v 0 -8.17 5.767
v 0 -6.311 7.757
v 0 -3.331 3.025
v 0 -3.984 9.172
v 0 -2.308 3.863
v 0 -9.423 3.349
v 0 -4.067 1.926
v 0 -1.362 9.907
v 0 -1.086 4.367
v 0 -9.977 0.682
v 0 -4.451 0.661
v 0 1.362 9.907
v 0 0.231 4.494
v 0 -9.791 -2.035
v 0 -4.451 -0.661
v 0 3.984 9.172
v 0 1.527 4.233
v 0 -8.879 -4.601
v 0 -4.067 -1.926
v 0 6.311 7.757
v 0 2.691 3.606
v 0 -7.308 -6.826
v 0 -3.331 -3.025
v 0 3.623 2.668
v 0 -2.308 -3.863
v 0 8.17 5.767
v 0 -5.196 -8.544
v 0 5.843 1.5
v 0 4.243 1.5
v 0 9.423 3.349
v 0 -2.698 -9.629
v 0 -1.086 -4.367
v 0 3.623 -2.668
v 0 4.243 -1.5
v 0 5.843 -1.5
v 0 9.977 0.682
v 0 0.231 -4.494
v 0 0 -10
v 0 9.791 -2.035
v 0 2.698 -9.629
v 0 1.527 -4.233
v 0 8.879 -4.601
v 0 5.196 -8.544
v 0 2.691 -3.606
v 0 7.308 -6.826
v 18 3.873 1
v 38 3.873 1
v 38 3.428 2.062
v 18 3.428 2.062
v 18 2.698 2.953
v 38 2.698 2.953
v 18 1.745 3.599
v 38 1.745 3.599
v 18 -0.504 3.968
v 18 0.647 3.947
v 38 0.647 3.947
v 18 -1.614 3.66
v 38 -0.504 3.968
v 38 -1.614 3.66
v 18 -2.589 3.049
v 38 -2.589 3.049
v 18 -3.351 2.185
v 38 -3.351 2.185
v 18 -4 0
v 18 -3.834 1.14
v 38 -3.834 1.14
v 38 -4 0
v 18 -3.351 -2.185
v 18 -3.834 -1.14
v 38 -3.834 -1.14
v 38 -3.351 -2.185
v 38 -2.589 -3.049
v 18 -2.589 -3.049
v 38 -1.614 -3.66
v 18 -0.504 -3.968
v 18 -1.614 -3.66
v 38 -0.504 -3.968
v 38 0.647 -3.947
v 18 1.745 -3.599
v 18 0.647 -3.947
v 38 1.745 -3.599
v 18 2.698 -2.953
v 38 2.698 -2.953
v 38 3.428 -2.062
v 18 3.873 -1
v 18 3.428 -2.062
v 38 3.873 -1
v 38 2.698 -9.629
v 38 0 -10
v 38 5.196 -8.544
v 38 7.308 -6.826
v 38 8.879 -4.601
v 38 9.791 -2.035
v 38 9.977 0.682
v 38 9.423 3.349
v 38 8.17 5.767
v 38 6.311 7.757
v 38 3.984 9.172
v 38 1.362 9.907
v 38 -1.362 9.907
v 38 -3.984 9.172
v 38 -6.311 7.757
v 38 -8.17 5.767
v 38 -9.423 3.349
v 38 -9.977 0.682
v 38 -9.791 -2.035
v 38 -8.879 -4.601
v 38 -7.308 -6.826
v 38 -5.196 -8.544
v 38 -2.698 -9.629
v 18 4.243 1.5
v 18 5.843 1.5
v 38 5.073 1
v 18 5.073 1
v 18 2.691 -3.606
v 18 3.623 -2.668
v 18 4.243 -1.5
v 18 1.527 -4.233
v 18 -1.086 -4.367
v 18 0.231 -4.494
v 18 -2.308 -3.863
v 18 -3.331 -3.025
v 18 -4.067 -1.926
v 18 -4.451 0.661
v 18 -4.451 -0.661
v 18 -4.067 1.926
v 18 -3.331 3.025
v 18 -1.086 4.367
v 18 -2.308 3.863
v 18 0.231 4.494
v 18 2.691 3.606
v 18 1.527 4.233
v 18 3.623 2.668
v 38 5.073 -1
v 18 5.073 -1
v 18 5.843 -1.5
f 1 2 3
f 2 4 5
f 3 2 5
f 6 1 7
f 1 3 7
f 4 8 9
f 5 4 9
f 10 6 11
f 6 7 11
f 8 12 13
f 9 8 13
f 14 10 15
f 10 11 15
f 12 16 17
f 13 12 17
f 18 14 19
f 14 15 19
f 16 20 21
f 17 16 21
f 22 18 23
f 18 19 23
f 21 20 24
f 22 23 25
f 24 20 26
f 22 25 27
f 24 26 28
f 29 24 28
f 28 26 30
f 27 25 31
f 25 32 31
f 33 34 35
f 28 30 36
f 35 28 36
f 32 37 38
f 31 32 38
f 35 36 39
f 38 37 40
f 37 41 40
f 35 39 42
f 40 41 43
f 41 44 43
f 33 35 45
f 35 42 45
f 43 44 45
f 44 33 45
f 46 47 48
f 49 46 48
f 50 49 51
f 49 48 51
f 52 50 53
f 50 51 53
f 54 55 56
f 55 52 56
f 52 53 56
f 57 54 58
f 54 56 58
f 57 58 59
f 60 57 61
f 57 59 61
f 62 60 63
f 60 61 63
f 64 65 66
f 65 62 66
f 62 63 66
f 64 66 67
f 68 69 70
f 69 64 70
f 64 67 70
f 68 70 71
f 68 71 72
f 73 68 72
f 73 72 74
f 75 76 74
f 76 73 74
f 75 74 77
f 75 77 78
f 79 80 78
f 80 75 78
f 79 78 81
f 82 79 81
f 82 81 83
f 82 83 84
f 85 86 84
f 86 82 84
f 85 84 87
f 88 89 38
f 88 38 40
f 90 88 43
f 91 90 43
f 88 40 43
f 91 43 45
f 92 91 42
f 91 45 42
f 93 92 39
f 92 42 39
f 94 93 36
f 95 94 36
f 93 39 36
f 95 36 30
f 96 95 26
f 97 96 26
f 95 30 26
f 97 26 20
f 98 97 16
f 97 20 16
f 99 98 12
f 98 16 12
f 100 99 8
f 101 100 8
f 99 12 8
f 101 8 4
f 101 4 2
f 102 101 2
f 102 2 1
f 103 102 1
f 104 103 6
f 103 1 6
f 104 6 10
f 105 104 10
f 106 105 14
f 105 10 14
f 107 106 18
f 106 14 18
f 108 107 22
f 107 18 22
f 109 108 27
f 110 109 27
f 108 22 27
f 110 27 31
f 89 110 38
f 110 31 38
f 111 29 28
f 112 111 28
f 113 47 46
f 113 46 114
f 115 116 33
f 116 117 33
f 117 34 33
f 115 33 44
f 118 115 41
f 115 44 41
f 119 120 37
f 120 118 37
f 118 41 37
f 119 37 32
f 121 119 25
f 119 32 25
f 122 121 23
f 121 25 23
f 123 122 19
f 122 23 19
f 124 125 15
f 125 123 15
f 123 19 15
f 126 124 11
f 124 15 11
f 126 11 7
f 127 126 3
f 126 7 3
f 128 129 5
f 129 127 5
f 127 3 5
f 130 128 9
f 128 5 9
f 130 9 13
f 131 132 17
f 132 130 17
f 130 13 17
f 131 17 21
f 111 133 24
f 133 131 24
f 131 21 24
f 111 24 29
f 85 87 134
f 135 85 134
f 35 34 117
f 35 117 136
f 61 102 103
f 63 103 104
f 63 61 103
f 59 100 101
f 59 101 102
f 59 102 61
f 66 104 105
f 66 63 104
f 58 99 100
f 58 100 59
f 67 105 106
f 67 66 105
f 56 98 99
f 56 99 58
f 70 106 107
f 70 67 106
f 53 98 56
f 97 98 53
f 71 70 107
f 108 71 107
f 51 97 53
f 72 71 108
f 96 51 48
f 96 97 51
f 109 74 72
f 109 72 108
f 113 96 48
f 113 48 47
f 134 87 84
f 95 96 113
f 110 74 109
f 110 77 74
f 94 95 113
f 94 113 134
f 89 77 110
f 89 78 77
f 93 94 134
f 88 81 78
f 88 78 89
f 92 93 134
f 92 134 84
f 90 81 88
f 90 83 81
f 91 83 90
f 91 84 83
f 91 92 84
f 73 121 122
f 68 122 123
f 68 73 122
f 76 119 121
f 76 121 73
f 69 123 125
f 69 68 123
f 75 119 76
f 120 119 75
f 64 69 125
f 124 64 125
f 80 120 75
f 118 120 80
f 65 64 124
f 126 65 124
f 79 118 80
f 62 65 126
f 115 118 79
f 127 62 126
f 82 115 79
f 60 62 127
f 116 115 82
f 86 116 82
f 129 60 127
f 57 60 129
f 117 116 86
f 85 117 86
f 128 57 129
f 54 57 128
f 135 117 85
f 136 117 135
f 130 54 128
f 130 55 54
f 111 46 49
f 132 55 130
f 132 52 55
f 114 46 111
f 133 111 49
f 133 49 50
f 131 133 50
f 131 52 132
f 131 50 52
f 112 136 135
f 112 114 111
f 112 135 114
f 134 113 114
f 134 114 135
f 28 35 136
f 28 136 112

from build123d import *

# Parameters (mm, degrees)
SKETCH1_R           = 10
BOSS_EXTRUDE2_DEPTH = 38
SKETCH9_R           = 4
CUT_EXTRUDE5_DEPTH  = 38
SKETCH10_R          = 4.5
CUT_EXTRUDE6_DEPTH  = 18
SKETCH11_W          = 3
SKETCH11_H          = 1.6
CUT_EXTRUDE7_DEPTH  = 18
SKETCH12_W          = 2
SKETCH12_H          = 1.2
CUT_EXTRUDE8_DEPTH  = 20


with BuildPart() as part:
    # Sketch1 → Boss-Extrude2 (new body)
    with BuildSketch(Plane(origin=(0, 0, 0), x_dir=(0, 0, -1), z_dir=(1, 0, 0))):
        Circle(SKETCH1_R)
    extrude(amount=BOSS_EXTRUDE2_DEPTH)

    # Sketch9 → Cut-Extrude5 (cut)
    with BuildSketch(Plane(origin=(38, 0, 0), x_dir=(0, 0, -1), z_dir=(1, 0, 0))):
        Circle(SKETCH9_R)
    extrude(amount=-CUT_EXTRUDE5_DEPTH, mode=Mode.SUBTRACT)

    # Sketch10 → Cut-Extrude6 (cut)
    with BuildSketch(Plane.ZY):
        Circle(SKETCH10_R)
    extrude(amount=-CUT_EXTRUDE6_DEPTH, mode=Mode.SUBTRACT)

    # Sketch11 → Cut-Extrude7 (cut)
    with BuildSketch(Plane.ZY):
        with Locations((0, 5.042640687)):
            Rectangle(SKETCH11_W, SKETCH11_H)
    extrude(amount=-CUT_EXTRUDE7_DEPTH, mode=Mode.SUBTRACT)

    # Sketch12 → Cut-Extrude8 (cut)
    with BuildSketch(Plane(origin=(38, 0, 0), x_dir=(0, 0, -1), z_dir=(1, 0, 0))):
        with Locations((0, 4.472983346)):
            Rectangle(SKETCH12_W, SKETCH12_H)
    extrude(amount=-CUT_EXTRUDE8_DEPTH, mode=Mode.SUBTRACT)


solid = part.part
